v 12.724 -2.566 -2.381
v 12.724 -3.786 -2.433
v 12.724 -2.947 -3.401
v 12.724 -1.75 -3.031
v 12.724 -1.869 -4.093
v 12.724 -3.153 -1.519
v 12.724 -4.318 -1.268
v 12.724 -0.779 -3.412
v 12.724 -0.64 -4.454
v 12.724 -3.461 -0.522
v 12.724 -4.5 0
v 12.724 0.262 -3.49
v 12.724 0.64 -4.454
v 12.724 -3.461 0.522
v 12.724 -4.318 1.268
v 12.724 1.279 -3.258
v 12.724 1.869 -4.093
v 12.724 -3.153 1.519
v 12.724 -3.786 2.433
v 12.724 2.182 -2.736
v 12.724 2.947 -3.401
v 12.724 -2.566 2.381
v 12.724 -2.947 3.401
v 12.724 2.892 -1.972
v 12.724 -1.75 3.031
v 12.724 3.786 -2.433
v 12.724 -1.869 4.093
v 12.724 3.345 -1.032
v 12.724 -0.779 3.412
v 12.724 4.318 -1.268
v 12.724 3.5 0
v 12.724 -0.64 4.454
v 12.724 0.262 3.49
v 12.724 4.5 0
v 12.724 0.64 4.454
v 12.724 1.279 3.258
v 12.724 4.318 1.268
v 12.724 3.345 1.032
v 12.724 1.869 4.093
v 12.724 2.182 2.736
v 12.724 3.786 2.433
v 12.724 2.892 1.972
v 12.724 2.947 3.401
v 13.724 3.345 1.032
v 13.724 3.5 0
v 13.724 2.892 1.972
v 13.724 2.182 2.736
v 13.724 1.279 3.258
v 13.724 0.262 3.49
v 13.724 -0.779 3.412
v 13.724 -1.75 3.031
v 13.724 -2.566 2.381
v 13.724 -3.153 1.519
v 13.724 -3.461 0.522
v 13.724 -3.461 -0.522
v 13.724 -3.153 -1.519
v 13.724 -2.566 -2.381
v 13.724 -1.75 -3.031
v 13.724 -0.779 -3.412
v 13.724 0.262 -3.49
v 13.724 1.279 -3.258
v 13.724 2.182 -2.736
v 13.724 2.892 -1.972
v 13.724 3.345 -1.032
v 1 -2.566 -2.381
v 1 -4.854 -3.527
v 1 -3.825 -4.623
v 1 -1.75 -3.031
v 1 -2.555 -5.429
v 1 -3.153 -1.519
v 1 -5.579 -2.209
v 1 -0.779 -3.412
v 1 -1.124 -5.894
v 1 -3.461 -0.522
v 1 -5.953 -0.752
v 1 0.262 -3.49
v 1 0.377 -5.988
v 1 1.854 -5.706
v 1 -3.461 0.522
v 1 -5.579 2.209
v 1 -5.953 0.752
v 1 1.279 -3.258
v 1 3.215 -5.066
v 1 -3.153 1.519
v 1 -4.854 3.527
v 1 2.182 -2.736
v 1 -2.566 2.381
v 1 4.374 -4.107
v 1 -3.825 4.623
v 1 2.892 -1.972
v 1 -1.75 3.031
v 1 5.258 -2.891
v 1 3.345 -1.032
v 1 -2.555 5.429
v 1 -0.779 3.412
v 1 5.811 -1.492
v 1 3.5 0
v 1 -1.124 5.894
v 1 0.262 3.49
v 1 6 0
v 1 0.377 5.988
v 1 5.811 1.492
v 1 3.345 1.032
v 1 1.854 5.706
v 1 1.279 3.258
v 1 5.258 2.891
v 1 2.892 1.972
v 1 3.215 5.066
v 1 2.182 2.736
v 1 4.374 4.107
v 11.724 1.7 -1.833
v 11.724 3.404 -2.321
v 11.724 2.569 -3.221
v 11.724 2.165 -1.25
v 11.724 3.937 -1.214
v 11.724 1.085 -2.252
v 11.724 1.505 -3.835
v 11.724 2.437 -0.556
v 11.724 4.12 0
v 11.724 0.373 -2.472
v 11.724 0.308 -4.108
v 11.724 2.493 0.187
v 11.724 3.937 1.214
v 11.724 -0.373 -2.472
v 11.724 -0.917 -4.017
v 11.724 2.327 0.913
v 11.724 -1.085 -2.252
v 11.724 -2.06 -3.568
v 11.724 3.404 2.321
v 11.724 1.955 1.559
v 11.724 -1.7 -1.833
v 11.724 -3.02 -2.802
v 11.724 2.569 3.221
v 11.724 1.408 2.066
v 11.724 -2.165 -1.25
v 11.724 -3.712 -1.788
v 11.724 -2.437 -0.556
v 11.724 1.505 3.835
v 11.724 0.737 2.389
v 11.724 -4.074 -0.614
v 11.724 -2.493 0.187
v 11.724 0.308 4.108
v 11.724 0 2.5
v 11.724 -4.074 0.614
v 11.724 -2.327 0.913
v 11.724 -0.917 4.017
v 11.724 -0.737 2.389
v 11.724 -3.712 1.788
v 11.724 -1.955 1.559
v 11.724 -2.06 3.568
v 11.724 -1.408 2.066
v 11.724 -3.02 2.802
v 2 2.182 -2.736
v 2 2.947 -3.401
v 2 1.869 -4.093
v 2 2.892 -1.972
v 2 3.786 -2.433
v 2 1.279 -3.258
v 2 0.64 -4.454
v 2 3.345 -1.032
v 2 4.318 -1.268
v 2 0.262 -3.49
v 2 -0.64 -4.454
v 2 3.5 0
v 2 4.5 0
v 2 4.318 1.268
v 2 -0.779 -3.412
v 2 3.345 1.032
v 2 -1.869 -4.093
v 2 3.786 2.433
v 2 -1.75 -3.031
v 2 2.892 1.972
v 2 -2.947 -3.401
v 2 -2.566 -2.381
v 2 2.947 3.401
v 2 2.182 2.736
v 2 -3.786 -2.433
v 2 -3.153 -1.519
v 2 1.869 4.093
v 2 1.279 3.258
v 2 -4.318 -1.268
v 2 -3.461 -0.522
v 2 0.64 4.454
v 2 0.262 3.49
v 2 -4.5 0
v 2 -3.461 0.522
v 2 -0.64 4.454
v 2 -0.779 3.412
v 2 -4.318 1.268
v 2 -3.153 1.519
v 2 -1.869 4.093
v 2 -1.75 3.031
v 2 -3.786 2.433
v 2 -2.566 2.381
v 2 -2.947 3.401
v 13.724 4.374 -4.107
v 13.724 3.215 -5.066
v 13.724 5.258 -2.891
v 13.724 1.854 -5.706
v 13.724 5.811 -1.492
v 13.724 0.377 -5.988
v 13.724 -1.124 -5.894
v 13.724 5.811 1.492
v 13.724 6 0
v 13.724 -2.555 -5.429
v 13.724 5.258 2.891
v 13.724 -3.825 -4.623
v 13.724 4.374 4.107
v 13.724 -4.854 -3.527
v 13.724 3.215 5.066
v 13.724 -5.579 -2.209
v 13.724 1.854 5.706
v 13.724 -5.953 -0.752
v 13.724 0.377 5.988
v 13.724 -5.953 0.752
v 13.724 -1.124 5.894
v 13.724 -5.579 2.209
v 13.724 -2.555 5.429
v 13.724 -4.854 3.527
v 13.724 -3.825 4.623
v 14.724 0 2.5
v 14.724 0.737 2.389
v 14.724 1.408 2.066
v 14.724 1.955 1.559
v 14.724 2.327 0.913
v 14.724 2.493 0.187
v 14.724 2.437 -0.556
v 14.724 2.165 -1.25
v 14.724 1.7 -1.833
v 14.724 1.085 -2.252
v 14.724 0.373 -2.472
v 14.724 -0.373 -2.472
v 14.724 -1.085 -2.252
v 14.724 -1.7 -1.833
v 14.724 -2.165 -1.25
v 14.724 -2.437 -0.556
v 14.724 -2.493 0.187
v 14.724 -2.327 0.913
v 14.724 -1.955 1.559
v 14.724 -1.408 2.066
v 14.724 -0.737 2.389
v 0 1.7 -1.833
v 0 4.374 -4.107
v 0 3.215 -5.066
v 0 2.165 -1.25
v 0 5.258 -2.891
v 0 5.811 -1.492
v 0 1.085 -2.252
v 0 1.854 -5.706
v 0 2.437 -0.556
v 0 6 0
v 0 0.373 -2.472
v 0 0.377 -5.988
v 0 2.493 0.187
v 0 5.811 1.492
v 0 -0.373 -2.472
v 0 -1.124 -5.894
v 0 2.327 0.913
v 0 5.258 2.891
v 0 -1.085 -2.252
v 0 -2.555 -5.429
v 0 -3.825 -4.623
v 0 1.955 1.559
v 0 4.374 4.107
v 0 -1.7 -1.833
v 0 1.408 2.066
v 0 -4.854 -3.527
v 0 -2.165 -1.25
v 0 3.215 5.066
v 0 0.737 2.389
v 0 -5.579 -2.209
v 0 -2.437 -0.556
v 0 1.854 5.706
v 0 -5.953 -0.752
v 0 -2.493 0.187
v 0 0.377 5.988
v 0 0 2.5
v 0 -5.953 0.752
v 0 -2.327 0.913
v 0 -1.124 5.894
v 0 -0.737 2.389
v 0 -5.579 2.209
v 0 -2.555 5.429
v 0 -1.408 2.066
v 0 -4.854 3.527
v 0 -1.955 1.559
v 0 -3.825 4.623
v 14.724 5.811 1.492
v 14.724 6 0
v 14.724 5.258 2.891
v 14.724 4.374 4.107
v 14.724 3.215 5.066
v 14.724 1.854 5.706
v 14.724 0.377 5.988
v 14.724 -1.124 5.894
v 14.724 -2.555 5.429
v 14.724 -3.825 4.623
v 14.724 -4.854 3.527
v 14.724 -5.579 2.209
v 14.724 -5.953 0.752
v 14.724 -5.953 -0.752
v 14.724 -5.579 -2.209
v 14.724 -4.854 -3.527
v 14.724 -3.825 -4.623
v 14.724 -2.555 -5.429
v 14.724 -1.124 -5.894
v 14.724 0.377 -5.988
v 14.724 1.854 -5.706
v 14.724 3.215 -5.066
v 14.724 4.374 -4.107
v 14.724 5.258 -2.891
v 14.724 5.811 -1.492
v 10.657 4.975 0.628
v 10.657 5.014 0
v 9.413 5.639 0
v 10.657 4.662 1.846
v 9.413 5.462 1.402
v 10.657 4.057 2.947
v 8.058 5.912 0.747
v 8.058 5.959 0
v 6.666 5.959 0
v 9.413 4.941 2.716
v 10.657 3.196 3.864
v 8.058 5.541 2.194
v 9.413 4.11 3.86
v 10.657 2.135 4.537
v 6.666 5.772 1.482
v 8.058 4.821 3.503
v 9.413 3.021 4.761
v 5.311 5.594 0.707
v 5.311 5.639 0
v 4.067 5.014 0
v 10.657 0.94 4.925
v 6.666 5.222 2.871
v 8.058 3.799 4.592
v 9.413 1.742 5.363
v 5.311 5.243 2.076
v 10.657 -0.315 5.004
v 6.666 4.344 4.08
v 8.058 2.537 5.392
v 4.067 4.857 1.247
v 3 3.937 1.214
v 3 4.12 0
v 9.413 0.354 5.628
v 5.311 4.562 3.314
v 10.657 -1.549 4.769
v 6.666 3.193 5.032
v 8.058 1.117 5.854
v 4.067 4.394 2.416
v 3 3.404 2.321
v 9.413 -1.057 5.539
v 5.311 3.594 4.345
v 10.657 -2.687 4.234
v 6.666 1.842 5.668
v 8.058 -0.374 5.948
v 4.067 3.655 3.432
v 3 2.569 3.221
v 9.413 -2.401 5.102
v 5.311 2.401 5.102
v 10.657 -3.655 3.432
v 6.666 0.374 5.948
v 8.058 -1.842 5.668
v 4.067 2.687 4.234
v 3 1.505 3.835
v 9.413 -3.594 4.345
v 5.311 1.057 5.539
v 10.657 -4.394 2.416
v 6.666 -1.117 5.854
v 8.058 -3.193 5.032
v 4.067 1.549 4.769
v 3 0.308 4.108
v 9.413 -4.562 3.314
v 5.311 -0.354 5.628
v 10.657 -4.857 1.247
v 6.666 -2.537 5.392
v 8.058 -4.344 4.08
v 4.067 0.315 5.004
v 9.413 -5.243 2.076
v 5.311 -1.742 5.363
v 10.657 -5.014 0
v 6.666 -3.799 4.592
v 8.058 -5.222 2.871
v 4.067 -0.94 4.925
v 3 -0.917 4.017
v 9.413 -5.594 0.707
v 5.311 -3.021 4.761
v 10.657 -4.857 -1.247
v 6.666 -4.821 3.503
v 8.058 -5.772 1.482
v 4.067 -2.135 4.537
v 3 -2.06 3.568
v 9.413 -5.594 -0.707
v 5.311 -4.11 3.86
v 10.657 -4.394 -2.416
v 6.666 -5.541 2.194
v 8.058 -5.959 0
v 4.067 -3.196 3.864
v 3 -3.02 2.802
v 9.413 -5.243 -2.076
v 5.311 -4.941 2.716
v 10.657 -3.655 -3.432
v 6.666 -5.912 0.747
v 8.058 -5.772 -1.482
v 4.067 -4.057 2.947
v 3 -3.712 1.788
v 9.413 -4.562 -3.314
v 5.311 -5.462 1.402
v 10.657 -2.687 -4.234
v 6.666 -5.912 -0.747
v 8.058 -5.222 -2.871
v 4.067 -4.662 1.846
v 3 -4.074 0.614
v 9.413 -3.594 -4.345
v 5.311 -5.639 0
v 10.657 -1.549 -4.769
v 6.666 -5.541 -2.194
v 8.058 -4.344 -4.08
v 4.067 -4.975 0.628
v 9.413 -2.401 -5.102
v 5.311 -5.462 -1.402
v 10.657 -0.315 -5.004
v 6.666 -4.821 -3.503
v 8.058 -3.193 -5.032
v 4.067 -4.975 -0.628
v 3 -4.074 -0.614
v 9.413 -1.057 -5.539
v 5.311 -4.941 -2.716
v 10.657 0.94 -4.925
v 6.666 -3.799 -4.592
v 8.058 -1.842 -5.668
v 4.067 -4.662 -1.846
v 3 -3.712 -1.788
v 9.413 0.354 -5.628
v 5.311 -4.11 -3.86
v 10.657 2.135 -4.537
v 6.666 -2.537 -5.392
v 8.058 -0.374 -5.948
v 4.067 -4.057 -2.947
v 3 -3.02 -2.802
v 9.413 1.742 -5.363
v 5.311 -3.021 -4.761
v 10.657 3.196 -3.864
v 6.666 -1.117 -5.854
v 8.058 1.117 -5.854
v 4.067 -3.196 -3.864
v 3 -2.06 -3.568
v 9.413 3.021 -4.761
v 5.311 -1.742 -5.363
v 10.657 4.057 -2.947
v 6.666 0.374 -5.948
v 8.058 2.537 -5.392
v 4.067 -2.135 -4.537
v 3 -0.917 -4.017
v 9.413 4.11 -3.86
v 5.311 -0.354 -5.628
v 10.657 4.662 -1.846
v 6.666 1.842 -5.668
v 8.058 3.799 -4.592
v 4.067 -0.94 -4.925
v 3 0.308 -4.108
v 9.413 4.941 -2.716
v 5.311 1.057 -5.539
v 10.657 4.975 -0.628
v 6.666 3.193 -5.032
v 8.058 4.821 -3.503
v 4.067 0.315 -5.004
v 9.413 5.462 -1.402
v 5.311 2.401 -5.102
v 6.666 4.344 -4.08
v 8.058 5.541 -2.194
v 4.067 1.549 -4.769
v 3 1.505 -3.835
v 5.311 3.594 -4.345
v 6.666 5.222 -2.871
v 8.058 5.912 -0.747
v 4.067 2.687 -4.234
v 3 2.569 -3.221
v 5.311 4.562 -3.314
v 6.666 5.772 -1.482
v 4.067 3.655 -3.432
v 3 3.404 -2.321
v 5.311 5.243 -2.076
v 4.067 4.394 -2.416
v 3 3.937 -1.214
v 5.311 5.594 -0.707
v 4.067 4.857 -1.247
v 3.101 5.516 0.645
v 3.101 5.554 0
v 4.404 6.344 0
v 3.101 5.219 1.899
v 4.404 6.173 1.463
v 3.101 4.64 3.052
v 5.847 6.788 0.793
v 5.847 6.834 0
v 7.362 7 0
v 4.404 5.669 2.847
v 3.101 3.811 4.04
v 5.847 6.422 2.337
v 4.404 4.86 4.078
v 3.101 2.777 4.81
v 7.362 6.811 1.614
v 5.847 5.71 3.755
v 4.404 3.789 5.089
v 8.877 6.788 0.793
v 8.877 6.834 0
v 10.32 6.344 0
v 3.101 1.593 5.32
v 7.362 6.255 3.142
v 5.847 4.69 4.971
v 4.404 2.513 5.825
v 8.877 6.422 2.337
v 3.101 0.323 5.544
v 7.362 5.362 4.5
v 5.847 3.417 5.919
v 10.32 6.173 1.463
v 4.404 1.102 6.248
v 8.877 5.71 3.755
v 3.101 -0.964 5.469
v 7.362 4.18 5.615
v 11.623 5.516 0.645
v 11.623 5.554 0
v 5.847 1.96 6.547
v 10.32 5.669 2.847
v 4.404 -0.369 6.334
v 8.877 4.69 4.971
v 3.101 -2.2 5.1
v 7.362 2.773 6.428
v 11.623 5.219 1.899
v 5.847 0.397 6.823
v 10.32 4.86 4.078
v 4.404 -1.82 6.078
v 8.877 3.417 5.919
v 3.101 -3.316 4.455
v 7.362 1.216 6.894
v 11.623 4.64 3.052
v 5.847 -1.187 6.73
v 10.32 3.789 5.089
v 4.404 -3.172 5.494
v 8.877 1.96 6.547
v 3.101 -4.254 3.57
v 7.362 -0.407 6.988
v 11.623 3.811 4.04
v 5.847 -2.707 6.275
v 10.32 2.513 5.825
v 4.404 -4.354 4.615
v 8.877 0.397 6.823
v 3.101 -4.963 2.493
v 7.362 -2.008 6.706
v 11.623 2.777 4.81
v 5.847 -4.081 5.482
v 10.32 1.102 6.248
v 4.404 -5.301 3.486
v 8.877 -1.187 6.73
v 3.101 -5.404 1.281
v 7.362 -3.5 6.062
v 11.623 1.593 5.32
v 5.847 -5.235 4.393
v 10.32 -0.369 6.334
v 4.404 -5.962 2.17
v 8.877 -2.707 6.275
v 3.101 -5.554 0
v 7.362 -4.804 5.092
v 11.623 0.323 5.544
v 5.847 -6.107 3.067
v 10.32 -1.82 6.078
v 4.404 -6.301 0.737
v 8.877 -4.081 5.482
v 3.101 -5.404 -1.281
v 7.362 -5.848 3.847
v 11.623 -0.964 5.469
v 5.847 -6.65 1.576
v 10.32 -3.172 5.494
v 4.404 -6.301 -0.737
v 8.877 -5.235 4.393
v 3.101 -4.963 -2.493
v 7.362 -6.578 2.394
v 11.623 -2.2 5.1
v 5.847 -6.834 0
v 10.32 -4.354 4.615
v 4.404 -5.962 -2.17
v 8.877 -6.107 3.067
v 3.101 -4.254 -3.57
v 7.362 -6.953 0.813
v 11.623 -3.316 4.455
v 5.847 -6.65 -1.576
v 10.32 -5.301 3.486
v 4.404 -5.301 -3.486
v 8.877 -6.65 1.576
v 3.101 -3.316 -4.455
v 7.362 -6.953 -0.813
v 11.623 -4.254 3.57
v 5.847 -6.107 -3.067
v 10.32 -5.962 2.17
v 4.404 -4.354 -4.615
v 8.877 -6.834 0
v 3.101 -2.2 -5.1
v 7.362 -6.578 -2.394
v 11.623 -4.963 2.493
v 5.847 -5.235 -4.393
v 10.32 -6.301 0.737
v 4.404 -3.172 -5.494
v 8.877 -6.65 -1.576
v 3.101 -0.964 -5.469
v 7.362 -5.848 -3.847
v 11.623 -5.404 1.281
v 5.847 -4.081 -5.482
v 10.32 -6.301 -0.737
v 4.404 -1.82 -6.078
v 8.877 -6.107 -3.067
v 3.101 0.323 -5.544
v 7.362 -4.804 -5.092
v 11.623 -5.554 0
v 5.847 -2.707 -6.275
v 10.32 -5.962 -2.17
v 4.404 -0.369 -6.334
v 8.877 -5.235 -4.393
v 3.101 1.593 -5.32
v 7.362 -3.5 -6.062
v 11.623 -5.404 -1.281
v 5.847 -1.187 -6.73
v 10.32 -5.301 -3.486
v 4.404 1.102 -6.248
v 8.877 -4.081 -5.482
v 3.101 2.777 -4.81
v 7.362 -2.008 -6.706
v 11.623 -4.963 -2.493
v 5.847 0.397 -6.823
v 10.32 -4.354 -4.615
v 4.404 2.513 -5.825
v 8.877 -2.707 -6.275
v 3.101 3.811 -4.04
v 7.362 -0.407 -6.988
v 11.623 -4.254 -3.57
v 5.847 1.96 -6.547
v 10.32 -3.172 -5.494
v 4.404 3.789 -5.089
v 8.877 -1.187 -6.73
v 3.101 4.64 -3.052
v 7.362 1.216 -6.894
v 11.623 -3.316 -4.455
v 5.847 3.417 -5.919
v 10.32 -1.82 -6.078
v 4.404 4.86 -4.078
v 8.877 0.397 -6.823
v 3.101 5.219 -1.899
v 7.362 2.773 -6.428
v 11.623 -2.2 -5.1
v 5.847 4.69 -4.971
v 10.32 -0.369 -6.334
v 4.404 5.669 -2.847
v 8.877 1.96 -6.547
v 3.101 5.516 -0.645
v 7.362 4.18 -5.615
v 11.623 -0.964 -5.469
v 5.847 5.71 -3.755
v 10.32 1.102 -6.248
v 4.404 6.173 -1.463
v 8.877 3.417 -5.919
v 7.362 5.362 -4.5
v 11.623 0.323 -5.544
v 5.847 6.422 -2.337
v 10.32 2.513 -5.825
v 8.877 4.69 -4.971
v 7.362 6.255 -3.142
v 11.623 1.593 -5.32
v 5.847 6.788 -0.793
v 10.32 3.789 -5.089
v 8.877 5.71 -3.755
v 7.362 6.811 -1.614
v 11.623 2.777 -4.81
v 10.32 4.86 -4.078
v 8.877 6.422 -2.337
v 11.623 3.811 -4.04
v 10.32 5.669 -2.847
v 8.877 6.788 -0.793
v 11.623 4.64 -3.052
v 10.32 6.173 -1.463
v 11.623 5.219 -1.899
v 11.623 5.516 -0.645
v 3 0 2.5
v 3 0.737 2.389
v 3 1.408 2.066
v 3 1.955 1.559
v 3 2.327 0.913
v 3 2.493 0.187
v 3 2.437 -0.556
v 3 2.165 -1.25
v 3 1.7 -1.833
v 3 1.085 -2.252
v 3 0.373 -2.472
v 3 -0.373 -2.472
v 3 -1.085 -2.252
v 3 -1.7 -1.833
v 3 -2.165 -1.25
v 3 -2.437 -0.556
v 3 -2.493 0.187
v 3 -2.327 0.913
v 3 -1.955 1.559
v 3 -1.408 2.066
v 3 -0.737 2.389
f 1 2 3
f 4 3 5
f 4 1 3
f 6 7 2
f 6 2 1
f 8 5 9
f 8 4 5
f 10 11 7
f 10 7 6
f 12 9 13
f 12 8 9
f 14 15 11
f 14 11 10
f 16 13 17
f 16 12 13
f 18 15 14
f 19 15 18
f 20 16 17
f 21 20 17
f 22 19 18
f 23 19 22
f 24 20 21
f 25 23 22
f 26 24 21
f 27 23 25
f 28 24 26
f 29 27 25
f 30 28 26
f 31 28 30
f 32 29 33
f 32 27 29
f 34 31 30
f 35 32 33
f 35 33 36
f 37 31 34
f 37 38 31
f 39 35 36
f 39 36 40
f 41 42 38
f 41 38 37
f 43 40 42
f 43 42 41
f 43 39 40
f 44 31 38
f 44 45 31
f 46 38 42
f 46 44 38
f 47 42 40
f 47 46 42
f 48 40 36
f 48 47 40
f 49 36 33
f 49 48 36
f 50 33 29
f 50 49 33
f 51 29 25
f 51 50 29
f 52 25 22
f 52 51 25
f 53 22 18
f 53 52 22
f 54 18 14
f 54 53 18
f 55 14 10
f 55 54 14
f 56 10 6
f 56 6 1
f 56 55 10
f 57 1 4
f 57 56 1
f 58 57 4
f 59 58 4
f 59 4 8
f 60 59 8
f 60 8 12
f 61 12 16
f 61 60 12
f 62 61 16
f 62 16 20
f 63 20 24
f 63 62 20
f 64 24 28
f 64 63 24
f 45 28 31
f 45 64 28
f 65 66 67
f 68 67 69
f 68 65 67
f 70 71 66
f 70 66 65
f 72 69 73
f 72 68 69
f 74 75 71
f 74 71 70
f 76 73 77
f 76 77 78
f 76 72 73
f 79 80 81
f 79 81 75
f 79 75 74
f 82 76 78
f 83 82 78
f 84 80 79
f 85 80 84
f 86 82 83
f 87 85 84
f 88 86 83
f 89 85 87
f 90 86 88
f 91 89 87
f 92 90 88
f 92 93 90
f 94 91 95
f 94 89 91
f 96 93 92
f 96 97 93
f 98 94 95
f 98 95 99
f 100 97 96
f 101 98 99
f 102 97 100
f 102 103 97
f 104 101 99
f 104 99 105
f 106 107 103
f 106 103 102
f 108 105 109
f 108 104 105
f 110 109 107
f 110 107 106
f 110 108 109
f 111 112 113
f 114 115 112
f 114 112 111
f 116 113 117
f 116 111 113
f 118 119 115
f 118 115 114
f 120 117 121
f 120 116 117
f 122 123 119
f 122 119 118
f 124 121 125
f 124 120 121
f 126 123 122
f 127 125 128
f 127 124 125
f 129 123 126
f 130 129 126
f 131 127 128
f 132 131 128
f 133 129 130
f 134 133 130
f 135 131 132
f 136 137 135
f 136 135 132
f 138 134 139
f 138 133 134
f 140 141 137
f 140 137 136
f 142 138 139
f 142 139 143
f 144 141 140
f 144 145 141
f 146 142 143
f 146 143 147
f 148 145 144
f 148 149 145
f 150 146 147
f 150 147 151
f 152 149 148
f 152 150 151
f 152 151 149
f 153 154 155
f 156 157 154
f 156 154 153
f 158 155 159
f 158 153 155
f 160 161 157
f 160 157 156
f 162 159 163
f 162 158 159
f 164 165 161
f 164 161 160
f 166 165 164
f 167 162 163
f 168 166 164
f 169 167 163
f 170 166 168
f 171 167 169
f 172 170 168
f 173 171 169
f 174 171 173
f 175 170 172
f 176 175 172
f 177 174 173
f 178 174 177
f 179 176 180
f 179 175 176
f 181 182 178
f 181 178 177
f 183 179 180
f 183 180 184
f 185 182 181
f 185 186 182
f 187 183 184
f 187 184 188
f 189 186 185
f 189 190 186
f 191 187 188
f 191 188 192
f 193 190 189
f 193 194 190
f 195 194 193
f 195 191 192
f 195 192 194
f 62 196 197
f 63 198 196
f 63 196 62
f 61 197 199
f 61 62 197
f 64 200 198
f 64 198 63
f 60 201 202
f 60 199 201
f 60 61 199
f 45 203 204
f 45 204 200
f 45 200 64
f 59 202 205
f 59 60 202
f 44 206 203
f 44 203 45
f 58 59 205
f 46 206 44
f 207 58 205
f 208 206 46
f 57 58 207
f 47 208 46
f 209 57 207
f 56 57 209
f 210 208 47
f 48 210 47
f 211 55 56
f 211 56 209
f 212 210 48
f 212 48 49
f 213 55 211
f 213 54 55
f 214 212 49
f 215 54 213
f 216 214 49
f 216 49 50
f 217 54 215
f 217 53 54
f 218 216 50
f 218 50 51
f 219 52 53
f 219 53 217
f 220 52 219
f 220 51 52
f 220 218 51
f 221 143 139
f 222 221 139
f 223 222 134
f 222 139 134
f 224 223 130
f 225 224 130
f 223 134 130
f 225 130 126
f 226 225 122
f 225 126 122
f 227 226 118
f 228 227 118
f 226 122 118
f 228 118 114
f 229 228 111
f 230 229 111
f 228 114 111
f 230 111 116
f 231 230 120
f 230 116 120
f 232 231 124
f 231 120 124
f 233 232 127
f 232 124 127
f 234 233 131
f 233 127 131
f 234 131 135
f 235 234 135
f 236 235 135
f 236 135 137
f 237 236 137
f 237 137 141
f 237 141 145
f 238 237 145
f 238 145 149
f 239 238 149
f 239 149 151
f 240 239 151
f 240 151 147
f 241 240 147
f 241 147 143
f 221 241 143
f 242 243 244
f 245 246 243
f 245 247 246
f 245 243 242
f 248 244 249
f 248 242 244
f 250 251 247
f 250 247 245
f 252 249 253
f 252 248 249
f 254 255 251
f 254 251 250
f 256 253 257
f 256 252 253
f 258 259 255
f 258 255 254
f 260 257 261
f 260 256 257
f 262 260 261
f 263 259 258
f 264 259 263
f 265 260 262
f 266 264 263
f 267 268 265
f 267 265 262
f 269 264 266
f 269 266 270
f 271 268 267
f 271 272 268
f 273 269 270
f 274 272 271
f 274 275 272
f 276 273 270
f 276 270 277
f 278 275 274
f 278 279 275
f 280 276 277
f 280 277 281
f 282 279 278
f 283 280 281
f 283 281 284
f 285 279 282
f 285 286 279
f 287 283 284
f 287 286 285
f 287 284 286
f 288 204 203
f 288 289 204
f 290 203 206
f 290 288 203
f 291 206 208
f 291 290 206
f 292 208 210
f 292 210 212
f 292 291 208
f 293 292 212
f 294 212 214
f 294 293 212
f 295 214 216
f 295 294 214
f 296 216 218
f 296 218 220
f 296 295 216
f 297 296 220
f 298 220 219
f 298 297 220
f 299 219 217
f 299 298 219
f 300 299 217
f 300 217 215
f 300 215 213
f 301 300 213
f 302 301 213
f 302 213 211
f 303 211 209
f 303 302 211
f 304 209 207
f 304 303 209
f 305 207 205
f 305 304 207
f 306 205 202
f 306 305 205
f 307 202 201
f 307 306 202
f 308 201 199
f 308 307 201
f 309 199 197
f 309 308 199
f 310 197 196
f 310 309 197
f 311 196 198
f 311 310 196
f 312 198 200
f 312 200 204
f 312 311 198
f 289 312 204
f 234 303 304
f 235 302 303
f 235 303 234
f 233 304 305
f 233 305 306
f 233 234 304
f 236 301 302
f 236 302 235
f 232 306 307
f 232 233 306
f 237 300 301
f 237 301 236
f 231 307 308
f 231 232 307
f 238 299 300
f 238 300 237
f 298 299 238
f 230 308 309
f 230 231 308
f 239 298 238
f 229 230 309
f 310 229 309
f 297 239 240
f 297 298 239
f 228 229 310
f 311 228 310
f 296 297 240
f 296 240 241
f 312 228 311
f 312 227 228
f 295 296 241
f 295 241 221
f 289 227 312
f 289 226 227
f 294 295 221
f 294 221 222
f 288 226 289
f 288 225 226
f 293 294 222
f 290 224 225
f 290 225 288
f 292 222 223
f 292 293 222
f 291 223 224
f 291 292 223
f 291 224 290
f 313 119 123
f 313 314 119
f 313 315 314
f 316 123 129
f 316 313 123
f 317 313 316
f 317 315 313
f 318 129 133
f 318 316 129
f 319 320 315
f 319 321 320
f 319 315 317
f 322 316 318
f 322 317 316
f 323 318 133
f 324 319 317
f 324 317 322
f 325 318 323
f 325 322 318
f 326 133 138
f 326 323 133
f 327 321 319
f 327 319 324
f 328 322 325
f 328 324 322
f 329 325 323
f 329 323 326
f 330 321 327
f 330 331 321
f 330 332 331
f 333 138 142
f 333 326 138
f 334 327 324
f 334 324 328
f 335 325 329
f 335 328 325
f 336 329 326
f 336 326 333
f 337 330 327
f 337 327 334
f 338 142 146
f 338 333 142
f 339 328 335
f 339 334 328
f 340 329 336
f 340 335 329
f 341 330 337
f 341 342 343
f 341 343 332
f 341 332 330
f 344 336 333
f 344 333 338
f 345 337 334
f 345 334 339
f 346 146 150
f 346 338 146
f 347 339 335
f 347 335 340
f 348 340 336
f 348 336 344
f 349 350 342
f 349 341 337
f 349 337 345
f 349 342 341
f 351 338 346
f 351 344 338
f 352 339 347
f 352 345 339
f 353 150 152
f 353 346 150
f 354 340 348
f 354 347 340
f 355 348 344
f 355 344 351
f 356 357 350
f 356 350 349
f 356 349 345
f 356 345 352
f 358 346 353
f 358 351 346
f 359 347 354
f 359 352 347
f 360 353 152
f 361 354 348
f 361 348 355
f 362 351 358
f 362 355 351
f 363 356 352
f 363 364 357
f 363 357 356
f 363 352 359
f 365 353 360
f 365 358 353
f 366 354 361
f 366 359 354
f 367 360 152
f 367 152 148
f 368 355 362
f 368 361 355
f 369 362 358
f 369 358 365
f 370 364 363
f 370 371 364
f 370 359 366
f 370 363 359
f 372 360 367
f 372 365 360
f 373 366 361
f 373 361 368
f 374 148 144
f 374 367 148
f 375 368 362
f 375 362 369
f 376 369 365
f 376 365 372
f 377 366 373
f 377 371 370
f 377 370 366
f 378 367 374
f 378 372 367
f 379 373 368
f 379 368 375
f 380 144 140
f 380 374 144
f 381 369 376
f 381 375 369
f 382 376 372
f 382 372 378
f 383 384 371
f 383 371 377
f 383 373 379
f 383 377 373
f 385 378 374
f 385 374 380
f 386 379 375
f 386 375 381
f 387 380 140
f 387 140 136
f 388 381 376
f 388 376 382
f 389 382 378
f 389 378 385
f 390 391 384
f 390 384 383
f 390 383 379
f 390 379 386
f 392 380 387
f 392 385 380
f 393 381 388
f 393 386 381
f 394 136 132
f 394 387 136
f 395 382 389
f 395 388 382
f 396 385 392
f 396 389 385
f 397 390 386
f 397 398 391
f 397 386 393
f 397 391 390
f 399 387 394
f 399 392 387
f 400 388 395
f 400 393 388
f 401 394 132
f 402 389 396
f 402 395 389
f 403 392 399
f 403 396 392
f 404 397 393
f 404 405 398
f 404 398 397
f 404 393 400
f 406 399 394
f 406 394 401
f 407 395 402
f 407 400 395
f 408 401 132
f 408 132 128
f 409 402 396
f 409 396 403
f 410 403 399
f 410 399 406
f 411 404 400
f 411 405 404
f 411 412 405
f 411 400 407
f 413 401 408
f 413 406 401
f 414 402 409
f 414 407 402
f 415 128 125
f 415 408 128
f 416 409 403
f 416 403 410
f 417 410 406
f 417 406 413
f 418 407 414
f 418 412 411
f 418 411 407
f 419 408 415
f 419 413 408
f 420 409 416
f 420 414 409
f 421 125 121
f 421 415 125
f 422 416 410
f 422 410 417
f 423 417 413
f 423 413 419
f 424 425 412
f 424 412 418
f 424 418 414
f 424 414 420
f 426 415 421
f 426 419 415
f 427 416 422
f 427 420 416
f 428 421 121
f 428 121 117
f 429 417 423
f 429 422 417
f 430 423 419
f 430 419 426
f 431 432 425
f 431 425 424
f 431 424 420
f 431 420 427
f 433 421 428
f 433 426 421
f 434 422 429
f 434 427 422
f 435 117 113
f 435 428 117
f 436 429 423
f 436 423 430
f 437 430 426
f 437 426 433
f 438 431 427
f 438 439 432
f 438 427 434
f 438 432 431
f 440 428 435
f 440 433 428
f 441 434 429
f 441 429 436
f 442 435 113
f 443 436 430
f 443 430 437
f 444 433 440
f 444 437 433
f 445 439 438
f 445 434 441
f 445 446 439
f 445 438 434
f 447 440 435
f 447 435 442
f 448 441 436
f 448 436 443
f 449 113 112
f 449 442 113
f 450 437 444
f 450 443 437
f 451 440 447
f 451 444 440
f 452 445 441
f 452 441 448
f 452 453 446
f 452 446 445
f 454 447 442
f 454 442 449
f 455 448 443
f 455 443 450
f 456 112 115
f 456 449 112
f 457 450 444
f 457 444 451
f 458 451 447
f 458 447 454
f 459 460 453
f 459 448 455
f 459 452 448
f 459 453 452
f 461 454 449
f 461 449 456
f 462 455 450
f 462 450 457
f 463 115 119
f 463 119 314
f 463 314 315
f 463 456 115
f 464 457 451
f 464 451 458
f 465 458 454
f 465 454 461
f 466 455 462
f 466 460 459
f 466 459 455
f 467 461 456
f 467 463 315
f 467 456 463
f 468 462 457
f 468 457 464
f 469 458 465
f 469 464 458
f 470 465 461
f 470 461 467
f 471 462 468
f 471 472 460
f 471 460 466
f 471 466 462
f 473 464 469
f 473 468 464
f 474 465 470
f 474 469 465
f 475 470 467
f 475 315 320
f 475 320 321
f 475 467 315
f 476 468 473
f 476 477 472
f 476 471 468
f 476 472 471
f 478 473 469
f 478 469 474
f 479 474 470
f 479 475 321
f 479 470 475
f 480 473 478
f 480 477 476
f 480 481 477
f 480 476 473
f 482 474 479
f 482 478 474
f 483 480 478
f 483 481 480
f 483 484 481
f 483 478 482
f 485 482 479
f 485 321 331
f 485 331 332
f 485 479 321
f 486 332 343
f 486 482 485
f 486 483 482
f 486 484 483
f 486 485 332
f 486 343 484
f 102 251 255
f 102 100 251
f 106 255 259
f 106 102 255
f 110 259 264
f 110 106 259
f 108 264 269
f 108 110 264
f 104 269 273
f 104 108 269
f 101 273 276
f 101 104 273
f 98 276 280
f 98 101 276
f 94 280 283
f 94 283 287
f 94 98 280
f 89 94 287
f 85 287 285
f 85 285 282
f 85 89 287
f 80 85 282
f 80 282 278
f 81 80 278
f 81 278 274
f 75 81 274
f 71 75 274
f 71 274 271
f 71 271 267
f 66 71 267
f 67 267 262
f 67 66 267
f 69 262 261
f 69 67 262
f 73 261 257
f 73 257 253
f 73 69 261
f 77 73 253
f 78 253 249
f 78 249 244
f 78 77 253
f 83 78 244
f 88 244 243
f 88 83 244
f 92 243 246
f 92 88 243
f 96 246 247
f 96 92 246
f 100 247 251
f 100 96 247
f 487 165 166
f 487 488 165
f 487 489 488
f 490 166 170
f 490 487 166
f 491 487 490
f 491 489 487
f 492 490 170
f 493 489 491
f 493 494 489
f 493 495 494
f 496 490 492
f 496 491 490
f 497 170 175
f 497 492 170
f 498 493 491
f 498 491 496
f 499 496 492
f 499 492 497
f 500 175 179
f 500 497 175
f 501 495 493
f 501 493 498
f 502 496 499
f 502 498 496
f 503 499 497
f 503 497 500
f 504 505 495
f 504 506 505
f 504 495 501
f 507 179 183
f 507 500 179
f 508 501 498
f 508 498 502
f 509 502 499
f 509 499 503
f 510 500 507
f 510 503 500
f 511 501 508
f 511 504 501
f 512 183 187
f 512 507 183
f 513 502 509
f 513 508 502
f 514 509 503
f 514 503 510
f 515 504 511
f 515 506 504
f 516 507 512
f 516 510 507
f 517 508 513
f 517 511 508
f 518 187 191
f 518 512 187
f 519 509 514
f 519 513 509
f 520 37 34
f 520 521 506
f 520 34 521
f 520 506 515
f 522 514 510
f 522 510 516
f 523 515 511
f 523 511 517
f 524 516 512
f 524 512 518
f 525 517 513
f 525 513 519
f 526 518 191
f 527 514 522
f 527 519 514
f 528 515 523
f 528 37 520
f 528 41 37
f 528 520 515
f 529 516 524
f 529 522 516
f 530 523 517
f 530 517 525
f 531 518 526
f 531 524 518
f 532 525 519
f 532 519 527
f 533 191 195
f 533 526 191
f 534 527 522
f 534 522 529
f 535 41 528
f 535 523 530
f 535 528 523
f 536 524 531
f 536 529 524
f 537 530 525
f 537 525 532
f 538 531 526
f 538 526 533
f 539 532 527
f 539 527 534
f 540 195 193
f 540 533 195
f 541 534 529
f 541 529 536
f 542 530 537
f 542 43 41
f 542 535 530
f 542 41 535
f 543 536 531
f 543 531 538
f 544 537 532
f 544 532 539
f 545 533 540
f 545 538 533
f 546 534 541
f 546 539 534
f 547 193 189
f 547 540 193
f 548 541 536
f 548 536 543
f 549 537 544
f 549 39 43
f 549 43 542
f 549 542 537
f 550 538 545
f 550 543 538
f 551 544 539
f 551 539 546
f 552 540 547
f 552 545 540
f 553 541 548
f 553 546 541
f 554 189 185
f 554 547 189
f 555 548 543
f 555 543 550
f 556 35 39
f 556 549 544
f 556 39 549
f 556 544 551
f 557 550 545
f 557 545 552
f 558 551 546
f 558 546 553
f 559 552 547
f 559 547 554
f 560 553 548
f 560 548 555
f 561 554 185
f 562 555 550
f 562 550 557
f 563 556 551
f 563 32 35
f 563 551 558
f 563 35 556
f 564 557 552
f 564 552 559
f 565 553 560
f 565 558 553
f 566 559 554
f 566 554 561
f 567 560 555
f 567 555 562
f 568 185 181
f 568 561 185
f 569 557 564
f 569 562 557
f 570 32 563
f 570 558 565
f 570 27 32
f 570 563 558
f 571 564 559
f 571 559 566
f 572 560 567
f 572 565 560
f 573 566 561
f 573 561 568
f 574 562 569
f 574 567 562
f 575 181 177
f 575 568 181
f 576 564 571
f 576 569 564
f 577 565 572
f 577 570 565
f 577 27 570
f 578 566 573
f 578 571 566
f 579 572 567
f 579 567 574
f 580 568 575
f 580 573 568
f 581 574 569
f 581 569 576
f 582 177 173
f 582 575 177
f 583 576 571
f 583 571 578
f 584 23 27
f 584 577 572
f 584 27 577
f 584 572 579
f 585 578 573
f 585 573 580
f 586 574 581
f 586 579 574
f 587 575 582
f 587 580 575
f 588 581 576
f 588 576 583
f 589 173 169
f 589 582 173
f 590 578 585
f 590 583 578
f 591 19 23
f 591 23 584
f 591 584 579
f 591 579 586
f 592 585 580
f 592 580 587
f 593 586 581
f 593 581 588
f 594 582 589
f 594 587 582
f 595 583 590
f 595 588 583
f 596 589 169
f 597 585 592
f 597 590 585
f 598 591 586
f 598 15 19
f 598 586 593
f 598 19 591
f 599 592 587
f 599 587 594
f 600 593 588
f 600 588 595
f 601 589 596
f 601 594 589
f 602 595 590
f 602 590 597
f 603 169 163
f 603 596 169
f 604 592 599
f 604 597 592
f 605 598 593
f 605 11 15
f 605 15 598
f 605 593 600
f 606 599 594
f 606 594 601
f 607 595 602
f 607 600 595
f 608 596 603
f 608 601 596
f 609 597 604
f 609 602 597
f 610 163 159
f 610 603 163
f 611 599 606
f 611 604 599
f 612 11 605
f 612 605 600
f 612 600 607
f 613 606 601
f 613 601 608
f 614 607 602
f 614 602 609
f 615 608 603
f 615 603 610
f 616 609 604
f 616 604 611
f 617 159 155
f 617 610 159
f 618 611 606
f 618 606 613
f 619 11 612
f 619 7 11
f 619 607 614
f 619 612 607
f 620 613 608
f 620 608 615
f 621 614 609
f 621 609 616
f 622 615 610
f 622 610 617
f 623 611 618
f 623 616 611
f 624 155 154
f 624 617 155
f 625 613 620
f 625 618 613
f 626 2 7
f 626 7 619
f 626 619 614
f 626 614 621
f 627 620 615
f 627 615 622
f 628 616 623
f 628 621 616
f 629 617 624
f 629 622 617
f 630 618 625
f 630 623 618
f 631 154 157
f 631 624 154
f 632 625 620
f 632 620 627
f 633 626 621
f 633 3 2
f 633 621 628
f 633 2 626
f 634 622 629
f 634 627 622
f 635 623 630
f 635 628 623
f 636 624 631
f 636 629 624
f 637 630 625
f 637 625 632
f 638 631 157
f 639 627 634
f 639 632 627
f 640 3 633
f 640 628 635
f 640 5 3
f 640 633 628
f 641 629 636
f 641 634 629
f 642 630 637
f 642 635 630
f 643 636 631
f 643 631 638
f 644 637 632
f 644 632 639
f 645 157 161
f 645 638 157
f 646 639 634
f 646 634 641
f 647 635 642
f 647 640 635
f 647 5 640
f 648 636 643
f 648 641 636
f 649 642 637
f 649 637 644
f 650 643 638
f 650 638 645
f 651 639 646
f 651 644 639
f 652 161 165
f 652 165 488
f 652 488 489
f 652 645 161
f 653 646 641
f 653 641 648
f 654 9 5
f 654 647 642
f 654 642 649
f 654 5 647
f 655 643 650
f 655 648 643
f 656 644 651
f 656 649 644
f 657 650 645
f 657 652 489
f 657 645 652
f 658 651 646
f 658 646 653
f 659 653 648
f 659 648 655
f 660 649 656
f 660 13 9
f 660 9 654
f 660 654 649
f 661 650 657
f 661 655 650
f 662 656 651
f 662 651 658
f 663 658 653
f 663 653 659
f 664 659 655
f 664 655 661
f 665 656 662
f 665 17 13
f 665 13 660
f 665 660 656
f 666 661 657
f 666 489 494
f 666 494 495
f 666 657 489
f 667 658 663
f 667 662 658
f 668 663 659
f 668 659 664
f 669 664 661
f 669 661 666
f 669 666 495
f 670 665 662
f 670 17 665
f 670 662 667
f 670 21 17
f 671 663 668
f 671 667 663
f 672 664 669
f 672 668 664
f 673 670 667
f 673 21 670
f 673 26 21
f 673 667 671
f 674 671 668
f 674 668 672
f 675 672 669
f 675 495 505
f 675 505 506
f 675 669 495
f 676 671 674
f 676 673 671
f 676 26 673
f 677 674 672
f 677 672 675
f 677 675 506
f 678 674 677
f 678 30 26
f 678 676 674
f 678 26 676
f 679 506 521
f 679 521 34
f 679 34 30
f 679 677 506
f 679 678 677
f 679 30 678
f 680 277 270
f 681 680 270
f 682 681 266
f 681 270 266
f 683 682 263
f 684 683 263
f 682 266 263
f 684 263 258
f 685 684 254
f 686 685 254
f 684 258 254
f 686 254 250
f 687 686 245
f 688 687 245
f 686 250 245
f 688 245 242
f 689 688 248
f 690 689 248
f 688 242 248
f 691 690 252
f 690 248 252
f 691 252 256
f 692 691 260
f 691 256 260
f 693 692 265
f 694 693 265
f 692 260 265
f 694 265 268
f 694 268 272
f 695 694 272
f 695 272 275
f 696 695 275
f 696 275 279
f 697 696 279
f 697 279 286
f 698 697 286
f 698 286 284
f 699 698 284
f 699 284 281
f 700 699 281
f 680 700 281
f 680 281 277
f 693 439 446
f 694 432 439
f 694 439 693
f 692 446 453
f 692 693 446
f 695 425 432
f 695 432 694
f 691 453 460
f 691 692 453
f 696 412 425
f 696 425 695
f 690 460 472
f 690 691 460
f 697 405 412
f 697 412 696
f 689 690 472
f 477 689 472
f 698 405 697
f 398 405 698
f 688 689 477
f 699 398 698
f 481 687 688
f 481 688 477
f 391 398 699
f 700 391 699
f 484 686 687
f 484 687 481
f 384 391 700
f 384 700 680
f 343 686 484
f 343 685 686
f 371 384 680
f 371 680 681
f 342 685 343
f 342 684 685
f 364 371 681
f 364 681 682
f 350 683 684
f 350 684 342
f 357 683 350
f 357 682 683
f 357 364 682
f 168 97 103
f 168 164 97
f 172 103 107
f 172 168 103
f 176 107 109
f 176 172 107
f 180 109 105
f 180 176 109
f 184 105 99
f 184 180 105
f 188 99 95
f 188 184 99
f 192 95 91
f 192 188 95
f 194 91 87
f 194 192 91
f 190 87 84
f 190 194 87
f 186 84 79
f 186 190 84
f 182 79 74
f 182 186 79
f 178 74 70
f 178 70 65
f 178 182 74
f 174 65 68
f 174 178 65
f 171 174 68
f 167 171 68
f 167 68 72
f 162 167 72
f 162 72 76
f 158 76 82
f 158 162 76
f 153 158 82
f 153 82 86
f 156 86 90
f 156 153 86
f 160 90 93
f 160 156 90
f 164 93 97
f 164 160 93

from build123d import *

# Parameters (mm, degrees)
SKETCH_2_R          = 2.5
CUT_EXTRUDE_1_DEPTH = 15.723805295


with BuildPart() as part:
    # Эскиз1 → Повернуть1 (revolve)
    with BuildSketch(Plane.XY):
        with BuildLine():
            Line((0, 0), (0, 6))
            Line((0, 6), (1, 6))
            Line((1, 6), (1, 3.5))
            Line((1, 3.5), (2, 3.5))
            Line((2, 3.5), (2, 4.5))
            ThreePointArc((2, 4.5), (7.361902647, 7), (12.723805295, 4.5))
            Line((12.723805295, 4.5), (12.723805295, 3.5))
            Line((12.723805295, 3.5), (13.723805295, 3.5))
            Line((13.723805295, 3.5), (13.723805295, 6))
            Line((13.723805295, 6), (14.723805295, 6))
            Line((14.723805295, 6), (14.723805295, 0))
            Line((14.723805295, 0), (11.723805295, 0))
            Line((11.723805295, 0), (11.723805295, 4.119927826))
            ThreePointArc((11.723805295, 4.119927826), (7.361902647, 6), (3, 4.119927826))
            Line((3, 4.119927826), (3, 0))
            Line((3, 0), (0, 0))
        make_face()
    revolve(axis=Axis((0, 0, 0), (1, 0, 0)))

    # Эскиз2 → Вырез-Вытянуть1 (cut, through all)
    with BuildSketch(Plane.ZY):
        Circle(SKETCH_2_R)
    extrude(amount=-CUT_EXTRUDE_1_DEPTH, mode=Mode.SUBTRACT)


solid = part.part
